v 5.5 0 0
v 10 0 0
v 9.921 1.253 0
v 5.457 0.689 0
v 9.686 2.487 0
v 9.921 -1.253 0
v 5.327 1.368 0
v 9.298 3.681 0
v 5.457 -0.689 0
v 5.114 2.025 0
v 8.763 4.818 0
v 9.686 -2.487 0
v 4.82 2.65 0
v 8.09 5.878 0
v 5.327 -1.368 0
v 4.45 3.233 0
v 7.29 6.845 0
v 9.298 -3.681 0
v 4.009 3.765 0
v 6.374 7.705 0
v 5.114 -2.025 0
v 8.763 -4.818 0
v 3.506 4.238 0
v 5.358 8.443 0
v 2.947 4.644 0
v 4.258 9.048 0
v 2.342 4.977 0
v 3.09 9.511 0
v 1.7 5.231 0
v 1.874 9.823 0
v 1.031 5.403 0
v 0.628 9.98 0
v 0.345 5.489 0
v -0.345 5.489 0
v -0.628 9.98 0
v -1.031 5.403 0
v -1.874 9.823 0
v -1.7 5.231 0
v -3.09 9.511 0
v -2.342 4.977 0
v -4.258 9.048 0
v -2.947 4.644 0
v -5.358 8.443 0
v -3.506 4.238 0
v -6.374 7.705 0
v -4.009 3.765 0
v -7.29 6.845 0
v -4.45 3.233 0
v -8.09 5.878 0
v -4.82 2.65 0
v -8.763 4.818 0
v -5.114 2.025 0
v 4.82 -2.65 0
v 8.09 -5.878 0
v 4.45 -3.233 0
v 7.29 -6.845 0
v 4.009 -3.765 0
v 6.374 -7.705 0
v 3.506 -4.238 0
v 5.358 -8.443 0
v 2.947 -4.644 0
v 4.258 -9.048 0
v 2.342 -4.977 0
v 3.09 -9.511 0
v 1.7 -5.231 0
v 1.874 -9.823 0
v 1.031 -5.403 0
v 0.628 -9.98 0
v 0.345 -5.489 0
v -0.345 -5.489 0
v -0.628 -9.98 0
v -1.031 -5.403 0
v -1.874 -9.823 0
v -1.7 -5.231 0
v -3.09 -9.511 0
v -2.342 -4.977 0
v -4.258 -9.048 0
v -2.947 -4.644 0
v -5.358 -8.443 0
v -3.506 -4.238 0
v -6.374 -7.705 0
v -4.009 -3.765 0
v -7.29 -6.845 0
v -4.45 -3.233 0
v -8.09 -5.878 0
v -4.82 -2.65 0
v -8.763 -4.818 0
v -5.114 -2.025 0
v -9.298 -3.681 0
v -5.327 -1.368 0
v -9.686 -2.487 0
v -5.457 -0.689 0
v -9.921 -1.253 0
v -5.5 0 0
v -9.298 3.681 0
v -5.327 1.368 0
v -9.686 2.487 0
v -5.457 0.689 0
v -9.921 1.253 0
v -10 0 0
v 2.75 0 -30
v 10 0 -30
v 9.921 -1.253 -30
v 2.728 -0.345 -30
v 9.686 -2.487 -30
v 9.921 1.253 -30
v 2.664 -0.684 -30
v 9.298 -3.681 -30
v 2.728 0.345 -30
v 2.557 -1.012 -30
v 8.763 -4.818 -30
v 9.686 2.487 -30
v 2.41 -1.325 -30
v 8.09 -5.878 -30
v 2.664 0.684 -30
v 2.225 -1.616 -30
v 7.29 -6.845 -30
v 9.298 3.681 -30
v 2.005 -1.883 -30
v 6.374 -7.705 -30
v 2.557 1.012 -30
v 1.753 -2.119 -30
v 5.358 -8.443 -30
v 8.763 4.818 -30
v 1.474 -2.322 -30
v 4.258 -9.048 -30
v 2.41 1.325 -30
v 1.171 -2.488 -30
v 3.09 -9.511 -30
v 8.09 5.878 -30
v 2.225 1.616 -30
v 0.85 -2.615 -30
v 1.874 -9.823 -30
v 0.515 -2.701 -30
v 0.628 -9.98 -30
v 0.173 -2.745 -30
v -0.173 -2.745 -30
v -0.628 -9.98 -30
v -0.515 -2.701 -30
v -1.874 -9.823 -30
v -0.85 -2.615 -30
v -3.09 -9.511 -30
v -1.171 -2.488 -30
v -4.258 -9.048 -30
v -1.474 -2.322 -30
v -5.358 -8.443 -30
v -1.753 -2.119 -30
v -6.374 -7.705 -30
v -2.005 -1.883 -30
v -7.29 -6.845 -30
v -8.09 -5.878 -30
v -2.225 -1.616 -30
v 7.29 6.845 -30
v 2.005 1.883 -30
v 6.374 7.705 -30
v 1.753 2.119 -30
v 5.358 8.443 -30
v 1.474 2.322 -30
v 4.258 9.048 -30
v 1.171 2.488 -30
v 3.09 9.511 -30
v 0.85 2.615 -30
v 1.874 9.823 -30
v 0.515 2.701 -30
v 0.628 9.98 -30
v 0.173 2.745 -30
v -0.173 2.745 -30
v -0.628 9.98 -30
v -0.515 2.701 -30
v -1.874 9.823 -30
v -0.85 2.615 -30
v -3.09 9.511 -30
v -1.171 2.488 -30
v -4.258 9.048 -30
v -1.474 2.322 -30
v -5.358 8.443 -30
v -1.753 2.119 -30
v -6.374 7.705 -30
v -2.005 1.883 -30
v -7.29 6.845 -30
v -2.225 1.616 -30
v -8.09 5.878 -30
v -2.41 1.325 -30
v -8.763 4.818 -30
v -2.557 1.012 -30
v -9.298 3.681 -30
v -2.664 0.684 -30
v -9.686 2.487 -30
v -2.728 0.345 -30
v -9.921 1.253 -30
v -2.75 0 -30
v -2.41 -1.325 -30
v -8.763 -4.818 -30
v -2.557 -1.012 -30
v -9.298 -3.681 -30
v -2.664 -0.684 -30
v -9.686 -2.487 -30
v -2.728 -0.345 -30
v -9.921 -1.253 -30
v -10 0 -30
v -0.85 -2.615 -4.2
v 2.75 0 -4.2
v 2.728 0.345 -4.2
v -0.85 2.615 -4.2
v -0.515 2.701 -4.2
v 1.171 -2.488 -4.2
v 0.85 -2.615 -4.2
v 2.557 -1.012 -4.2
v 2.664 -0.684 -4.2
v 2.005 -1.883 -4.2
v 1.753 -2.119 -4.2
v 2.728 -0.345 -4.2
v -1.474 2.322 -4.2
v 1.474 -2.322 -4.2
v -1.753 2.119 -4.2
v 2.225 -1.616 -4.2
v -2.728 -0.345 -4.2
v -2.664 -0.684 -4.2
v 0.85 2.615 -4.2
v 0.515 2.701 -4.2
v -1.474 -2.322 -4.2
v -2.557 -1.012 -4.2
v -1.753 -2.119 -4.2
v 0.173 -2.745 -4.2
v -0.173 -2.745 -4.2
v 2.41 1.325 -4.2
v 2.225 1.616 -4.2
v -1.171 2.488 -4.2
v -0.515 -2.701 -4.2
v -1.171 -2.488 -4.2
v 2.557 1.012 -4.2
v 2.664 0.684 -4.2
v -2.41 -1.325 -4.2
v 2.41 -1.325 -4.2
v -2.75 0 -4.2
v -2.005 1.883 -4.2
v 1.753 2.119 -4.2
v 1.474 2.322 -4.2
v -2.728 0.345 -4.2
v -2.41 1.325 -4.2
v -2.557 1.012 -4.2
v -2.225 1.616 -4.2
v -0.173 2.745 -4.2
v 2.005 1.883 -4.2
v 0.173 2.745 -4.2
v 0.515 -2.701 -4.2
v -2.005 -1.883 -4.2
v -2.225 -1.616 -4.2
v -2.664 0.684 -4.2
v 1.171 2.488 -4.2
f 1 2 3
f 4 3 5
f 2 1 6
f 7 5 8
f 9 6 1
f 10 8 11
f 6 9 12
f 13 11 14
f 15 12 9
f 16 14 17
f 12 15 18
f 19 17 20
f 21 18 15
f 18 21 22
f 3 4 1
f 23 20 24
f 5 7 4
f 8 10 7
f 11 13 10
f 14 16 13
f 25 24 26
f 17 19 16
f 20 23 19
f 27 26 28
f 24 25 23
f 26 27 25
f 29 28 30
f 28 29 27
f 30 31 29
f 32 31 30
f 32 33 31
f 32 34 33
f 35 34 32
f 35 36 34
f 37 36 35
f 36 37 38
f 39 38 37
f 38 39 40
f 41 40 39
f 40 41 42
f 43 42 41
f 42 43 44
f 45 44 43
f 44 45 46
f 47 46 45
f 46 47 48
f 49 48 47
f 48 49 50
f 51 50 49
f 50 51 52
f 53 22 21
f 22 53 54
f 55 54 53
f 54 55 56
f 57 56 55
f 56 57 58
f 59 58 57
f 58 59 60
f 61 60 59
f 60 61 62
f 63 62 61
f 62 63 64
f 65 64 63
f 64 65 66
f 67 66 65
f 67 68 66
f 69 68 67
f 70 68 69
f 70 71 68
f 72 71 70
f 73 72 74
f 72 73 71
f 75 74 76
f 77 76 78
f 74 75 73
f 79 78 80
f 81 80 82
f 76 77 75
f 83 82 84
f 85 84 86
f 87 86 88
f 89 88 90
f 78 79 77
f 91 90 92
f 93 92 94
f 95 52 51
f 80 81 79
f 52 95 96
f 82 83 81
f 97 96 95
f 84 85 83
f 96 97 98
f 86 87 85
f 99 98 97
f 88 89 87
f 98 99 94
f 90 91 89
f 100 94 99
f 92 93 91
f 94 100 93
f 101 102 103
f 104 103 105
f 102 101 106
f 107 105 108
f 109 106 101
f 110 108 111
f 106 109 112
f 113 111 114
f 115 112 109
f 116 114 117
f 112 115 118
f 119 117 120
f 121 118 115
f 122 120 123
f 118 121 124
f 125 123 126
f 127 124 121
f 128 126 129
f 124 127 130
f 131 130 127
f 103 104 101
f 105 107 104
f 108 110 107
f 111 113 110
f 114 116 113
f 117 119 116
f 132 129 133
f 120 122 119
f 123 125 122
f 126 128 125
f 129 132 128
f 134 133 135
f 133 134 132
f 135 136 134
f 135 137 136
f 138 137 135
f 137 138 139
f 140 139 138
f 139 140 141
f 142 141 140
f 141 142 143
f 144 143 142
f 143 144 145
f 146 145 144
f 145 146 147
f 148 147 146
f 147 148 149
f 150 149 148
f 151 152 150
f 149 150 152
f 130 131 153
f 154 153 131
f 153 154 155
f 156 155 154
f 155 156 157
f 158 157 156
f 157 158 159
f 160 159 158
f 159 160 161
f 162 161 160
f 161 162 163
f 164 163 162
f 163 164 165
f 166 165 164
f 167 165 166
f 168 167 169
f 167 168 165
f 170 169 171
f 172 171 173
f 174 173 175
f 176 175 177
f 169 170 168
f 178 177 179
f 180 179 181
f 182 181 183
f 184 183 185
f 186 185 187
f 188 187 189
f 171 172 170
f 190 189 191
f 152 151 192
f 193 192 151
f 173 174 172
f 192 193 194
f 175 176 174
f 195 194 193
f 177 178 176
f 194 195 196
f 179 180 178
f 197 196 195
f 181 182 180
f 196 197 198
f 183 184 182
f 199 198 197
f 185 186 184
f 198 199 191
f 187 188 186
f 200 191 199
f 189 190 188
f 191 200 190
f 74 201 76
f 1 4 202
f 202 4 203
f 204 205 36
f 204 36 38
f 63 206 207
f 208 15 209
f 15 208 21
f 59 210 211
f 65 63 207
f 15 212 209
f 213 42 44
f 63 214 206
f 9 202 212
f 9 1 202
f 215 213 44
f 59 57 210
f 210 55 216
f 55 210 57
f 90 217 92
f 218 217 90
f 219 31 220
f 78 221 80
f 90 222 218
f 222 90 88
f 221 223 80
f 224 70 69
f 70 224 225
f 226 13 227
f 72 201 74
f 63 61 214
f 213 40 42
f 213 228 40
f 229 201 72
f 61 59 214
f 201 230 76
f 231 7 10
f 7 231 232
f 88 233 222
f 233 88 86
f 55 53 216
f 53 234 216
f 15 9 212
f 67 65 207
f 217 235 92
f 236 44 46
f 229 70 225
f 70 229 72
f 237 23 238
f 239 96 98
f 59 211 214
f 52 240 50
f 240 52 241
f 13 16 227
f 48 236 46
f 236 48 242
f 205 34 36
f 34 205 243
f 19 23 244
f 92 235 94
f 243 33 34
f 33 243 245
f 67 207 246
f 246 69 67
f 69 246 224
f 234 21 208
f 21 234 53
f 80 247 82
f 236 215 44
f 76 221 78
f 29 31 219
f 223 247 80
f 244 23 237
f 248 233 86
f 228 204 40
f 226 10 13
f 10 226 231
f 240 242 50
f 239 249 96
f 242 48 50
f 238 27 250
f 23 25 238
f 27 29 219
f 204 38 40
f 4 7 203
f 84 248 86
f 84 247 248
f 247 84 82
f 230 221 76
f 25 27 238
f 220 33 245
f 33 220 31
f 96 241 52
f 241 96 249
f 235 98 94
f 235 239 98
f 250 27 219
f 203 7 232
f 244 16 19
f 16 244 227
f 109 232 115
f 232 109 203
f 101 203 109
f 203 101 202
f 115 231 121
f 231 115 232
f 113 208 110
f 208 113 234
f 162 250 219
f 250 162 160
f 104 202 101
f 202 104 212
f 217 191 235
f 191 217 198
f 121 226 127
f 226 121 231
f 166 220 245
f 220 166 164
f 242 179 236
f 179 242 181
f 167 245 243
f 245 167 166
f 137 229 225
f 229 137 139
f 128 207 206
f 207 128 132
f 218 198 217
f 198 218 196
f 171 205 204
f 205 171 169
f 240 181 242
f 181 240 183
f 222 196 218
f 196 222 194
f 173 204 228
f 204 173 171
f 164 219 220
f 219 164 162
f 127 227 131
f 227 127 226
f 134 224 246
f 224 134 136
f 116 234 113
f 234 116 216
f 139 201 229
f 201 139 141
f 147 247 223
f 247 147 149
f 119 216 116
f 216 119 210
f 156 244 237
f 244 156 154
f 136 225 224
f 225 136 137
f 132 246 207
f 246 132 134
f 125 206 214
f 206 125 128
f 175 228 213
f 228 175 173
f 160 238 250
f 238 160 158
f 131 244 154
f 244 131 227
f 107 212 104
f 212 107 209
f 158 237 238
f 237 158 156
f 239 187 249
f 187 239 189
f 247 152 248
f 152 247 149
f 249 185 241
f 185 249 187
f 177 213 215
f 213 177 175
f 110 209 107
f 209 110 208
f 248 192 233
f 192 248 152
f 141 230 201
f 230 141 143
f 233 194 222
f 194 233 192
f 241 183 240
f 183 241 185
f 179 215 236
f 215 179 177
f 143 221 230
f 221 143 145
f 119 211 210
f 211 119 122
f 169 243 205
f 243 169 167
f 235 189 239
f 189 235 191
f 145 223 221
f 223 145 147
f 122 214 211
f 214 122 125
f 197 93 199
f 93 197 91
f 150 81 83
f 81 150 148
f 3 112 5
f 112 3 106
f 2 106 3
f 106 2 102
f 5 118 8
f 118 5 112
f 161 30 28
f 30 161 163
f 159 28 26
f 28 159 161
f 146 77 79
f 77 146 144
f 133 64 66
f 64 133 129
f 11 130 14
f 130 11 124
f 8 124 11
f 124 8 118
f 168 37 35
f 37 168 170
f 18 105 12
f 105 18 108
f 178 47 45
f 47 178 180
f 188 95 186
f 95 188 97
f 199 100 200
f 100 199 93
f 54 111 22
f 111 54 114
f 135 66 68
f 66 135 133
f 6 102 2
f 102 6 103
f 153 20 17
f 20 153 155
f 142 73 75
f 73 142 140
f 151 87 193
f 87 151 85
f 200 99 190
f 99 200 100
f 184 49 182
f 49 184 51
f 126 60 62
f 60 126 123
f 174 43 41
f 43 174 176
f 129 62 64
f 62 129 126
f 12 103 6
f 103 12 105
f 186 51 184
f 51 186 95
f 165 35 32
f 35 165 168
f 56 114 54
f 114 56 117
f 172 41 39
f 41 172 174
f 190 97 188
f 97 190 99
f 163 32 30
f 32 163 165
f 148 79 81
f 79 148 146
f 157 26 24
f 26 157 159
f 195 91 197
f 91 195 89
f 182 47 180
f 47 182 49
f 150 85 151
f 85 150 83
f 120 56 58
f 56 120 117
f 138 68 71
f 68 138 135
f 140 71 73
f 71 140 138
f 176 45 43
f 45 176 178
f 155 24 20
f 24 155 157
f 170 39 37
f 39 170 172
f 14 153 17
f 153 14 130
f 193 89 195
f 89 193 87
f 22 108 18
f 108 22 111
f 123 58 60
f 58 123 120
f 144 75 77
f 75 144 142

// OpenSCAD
$fn = 50;


difference() {
	union() {
		translate(v = [0, 0, -30.0000000000]) {
			cylinder(h = 30, r = 10.0000000000);
		}
		cylinder(h = 0, r = 19.0000000000);
	}
	union() {
		translate(v = [0, 0, 0]) {
			rotate(a = [0, 0, 0]) {
				difference() {
					union() {
						#translate(v = [0, 0, -30.0000000000]) {
							cylinder(h = 30, r = 2.2500000000);
						}
						#translate(v = [0, 0, -4.2000000000]) {
							cylinder(h = 4.2000000000, r = 10.0000000000, r1 = 2.7500000000, r2 = 5.5000000000);
						}
						#translate(v = [0, 0, -30.0000000000]) {
							cylinder(h = 30, r = 2.7500000000);
						}
						#translate(v = [0, 0, -30.0000000000]) {
							cylinder(h = 30, r = 2.2500000000);
						}
					}
					union();
				}
			}
		}
	}
}
